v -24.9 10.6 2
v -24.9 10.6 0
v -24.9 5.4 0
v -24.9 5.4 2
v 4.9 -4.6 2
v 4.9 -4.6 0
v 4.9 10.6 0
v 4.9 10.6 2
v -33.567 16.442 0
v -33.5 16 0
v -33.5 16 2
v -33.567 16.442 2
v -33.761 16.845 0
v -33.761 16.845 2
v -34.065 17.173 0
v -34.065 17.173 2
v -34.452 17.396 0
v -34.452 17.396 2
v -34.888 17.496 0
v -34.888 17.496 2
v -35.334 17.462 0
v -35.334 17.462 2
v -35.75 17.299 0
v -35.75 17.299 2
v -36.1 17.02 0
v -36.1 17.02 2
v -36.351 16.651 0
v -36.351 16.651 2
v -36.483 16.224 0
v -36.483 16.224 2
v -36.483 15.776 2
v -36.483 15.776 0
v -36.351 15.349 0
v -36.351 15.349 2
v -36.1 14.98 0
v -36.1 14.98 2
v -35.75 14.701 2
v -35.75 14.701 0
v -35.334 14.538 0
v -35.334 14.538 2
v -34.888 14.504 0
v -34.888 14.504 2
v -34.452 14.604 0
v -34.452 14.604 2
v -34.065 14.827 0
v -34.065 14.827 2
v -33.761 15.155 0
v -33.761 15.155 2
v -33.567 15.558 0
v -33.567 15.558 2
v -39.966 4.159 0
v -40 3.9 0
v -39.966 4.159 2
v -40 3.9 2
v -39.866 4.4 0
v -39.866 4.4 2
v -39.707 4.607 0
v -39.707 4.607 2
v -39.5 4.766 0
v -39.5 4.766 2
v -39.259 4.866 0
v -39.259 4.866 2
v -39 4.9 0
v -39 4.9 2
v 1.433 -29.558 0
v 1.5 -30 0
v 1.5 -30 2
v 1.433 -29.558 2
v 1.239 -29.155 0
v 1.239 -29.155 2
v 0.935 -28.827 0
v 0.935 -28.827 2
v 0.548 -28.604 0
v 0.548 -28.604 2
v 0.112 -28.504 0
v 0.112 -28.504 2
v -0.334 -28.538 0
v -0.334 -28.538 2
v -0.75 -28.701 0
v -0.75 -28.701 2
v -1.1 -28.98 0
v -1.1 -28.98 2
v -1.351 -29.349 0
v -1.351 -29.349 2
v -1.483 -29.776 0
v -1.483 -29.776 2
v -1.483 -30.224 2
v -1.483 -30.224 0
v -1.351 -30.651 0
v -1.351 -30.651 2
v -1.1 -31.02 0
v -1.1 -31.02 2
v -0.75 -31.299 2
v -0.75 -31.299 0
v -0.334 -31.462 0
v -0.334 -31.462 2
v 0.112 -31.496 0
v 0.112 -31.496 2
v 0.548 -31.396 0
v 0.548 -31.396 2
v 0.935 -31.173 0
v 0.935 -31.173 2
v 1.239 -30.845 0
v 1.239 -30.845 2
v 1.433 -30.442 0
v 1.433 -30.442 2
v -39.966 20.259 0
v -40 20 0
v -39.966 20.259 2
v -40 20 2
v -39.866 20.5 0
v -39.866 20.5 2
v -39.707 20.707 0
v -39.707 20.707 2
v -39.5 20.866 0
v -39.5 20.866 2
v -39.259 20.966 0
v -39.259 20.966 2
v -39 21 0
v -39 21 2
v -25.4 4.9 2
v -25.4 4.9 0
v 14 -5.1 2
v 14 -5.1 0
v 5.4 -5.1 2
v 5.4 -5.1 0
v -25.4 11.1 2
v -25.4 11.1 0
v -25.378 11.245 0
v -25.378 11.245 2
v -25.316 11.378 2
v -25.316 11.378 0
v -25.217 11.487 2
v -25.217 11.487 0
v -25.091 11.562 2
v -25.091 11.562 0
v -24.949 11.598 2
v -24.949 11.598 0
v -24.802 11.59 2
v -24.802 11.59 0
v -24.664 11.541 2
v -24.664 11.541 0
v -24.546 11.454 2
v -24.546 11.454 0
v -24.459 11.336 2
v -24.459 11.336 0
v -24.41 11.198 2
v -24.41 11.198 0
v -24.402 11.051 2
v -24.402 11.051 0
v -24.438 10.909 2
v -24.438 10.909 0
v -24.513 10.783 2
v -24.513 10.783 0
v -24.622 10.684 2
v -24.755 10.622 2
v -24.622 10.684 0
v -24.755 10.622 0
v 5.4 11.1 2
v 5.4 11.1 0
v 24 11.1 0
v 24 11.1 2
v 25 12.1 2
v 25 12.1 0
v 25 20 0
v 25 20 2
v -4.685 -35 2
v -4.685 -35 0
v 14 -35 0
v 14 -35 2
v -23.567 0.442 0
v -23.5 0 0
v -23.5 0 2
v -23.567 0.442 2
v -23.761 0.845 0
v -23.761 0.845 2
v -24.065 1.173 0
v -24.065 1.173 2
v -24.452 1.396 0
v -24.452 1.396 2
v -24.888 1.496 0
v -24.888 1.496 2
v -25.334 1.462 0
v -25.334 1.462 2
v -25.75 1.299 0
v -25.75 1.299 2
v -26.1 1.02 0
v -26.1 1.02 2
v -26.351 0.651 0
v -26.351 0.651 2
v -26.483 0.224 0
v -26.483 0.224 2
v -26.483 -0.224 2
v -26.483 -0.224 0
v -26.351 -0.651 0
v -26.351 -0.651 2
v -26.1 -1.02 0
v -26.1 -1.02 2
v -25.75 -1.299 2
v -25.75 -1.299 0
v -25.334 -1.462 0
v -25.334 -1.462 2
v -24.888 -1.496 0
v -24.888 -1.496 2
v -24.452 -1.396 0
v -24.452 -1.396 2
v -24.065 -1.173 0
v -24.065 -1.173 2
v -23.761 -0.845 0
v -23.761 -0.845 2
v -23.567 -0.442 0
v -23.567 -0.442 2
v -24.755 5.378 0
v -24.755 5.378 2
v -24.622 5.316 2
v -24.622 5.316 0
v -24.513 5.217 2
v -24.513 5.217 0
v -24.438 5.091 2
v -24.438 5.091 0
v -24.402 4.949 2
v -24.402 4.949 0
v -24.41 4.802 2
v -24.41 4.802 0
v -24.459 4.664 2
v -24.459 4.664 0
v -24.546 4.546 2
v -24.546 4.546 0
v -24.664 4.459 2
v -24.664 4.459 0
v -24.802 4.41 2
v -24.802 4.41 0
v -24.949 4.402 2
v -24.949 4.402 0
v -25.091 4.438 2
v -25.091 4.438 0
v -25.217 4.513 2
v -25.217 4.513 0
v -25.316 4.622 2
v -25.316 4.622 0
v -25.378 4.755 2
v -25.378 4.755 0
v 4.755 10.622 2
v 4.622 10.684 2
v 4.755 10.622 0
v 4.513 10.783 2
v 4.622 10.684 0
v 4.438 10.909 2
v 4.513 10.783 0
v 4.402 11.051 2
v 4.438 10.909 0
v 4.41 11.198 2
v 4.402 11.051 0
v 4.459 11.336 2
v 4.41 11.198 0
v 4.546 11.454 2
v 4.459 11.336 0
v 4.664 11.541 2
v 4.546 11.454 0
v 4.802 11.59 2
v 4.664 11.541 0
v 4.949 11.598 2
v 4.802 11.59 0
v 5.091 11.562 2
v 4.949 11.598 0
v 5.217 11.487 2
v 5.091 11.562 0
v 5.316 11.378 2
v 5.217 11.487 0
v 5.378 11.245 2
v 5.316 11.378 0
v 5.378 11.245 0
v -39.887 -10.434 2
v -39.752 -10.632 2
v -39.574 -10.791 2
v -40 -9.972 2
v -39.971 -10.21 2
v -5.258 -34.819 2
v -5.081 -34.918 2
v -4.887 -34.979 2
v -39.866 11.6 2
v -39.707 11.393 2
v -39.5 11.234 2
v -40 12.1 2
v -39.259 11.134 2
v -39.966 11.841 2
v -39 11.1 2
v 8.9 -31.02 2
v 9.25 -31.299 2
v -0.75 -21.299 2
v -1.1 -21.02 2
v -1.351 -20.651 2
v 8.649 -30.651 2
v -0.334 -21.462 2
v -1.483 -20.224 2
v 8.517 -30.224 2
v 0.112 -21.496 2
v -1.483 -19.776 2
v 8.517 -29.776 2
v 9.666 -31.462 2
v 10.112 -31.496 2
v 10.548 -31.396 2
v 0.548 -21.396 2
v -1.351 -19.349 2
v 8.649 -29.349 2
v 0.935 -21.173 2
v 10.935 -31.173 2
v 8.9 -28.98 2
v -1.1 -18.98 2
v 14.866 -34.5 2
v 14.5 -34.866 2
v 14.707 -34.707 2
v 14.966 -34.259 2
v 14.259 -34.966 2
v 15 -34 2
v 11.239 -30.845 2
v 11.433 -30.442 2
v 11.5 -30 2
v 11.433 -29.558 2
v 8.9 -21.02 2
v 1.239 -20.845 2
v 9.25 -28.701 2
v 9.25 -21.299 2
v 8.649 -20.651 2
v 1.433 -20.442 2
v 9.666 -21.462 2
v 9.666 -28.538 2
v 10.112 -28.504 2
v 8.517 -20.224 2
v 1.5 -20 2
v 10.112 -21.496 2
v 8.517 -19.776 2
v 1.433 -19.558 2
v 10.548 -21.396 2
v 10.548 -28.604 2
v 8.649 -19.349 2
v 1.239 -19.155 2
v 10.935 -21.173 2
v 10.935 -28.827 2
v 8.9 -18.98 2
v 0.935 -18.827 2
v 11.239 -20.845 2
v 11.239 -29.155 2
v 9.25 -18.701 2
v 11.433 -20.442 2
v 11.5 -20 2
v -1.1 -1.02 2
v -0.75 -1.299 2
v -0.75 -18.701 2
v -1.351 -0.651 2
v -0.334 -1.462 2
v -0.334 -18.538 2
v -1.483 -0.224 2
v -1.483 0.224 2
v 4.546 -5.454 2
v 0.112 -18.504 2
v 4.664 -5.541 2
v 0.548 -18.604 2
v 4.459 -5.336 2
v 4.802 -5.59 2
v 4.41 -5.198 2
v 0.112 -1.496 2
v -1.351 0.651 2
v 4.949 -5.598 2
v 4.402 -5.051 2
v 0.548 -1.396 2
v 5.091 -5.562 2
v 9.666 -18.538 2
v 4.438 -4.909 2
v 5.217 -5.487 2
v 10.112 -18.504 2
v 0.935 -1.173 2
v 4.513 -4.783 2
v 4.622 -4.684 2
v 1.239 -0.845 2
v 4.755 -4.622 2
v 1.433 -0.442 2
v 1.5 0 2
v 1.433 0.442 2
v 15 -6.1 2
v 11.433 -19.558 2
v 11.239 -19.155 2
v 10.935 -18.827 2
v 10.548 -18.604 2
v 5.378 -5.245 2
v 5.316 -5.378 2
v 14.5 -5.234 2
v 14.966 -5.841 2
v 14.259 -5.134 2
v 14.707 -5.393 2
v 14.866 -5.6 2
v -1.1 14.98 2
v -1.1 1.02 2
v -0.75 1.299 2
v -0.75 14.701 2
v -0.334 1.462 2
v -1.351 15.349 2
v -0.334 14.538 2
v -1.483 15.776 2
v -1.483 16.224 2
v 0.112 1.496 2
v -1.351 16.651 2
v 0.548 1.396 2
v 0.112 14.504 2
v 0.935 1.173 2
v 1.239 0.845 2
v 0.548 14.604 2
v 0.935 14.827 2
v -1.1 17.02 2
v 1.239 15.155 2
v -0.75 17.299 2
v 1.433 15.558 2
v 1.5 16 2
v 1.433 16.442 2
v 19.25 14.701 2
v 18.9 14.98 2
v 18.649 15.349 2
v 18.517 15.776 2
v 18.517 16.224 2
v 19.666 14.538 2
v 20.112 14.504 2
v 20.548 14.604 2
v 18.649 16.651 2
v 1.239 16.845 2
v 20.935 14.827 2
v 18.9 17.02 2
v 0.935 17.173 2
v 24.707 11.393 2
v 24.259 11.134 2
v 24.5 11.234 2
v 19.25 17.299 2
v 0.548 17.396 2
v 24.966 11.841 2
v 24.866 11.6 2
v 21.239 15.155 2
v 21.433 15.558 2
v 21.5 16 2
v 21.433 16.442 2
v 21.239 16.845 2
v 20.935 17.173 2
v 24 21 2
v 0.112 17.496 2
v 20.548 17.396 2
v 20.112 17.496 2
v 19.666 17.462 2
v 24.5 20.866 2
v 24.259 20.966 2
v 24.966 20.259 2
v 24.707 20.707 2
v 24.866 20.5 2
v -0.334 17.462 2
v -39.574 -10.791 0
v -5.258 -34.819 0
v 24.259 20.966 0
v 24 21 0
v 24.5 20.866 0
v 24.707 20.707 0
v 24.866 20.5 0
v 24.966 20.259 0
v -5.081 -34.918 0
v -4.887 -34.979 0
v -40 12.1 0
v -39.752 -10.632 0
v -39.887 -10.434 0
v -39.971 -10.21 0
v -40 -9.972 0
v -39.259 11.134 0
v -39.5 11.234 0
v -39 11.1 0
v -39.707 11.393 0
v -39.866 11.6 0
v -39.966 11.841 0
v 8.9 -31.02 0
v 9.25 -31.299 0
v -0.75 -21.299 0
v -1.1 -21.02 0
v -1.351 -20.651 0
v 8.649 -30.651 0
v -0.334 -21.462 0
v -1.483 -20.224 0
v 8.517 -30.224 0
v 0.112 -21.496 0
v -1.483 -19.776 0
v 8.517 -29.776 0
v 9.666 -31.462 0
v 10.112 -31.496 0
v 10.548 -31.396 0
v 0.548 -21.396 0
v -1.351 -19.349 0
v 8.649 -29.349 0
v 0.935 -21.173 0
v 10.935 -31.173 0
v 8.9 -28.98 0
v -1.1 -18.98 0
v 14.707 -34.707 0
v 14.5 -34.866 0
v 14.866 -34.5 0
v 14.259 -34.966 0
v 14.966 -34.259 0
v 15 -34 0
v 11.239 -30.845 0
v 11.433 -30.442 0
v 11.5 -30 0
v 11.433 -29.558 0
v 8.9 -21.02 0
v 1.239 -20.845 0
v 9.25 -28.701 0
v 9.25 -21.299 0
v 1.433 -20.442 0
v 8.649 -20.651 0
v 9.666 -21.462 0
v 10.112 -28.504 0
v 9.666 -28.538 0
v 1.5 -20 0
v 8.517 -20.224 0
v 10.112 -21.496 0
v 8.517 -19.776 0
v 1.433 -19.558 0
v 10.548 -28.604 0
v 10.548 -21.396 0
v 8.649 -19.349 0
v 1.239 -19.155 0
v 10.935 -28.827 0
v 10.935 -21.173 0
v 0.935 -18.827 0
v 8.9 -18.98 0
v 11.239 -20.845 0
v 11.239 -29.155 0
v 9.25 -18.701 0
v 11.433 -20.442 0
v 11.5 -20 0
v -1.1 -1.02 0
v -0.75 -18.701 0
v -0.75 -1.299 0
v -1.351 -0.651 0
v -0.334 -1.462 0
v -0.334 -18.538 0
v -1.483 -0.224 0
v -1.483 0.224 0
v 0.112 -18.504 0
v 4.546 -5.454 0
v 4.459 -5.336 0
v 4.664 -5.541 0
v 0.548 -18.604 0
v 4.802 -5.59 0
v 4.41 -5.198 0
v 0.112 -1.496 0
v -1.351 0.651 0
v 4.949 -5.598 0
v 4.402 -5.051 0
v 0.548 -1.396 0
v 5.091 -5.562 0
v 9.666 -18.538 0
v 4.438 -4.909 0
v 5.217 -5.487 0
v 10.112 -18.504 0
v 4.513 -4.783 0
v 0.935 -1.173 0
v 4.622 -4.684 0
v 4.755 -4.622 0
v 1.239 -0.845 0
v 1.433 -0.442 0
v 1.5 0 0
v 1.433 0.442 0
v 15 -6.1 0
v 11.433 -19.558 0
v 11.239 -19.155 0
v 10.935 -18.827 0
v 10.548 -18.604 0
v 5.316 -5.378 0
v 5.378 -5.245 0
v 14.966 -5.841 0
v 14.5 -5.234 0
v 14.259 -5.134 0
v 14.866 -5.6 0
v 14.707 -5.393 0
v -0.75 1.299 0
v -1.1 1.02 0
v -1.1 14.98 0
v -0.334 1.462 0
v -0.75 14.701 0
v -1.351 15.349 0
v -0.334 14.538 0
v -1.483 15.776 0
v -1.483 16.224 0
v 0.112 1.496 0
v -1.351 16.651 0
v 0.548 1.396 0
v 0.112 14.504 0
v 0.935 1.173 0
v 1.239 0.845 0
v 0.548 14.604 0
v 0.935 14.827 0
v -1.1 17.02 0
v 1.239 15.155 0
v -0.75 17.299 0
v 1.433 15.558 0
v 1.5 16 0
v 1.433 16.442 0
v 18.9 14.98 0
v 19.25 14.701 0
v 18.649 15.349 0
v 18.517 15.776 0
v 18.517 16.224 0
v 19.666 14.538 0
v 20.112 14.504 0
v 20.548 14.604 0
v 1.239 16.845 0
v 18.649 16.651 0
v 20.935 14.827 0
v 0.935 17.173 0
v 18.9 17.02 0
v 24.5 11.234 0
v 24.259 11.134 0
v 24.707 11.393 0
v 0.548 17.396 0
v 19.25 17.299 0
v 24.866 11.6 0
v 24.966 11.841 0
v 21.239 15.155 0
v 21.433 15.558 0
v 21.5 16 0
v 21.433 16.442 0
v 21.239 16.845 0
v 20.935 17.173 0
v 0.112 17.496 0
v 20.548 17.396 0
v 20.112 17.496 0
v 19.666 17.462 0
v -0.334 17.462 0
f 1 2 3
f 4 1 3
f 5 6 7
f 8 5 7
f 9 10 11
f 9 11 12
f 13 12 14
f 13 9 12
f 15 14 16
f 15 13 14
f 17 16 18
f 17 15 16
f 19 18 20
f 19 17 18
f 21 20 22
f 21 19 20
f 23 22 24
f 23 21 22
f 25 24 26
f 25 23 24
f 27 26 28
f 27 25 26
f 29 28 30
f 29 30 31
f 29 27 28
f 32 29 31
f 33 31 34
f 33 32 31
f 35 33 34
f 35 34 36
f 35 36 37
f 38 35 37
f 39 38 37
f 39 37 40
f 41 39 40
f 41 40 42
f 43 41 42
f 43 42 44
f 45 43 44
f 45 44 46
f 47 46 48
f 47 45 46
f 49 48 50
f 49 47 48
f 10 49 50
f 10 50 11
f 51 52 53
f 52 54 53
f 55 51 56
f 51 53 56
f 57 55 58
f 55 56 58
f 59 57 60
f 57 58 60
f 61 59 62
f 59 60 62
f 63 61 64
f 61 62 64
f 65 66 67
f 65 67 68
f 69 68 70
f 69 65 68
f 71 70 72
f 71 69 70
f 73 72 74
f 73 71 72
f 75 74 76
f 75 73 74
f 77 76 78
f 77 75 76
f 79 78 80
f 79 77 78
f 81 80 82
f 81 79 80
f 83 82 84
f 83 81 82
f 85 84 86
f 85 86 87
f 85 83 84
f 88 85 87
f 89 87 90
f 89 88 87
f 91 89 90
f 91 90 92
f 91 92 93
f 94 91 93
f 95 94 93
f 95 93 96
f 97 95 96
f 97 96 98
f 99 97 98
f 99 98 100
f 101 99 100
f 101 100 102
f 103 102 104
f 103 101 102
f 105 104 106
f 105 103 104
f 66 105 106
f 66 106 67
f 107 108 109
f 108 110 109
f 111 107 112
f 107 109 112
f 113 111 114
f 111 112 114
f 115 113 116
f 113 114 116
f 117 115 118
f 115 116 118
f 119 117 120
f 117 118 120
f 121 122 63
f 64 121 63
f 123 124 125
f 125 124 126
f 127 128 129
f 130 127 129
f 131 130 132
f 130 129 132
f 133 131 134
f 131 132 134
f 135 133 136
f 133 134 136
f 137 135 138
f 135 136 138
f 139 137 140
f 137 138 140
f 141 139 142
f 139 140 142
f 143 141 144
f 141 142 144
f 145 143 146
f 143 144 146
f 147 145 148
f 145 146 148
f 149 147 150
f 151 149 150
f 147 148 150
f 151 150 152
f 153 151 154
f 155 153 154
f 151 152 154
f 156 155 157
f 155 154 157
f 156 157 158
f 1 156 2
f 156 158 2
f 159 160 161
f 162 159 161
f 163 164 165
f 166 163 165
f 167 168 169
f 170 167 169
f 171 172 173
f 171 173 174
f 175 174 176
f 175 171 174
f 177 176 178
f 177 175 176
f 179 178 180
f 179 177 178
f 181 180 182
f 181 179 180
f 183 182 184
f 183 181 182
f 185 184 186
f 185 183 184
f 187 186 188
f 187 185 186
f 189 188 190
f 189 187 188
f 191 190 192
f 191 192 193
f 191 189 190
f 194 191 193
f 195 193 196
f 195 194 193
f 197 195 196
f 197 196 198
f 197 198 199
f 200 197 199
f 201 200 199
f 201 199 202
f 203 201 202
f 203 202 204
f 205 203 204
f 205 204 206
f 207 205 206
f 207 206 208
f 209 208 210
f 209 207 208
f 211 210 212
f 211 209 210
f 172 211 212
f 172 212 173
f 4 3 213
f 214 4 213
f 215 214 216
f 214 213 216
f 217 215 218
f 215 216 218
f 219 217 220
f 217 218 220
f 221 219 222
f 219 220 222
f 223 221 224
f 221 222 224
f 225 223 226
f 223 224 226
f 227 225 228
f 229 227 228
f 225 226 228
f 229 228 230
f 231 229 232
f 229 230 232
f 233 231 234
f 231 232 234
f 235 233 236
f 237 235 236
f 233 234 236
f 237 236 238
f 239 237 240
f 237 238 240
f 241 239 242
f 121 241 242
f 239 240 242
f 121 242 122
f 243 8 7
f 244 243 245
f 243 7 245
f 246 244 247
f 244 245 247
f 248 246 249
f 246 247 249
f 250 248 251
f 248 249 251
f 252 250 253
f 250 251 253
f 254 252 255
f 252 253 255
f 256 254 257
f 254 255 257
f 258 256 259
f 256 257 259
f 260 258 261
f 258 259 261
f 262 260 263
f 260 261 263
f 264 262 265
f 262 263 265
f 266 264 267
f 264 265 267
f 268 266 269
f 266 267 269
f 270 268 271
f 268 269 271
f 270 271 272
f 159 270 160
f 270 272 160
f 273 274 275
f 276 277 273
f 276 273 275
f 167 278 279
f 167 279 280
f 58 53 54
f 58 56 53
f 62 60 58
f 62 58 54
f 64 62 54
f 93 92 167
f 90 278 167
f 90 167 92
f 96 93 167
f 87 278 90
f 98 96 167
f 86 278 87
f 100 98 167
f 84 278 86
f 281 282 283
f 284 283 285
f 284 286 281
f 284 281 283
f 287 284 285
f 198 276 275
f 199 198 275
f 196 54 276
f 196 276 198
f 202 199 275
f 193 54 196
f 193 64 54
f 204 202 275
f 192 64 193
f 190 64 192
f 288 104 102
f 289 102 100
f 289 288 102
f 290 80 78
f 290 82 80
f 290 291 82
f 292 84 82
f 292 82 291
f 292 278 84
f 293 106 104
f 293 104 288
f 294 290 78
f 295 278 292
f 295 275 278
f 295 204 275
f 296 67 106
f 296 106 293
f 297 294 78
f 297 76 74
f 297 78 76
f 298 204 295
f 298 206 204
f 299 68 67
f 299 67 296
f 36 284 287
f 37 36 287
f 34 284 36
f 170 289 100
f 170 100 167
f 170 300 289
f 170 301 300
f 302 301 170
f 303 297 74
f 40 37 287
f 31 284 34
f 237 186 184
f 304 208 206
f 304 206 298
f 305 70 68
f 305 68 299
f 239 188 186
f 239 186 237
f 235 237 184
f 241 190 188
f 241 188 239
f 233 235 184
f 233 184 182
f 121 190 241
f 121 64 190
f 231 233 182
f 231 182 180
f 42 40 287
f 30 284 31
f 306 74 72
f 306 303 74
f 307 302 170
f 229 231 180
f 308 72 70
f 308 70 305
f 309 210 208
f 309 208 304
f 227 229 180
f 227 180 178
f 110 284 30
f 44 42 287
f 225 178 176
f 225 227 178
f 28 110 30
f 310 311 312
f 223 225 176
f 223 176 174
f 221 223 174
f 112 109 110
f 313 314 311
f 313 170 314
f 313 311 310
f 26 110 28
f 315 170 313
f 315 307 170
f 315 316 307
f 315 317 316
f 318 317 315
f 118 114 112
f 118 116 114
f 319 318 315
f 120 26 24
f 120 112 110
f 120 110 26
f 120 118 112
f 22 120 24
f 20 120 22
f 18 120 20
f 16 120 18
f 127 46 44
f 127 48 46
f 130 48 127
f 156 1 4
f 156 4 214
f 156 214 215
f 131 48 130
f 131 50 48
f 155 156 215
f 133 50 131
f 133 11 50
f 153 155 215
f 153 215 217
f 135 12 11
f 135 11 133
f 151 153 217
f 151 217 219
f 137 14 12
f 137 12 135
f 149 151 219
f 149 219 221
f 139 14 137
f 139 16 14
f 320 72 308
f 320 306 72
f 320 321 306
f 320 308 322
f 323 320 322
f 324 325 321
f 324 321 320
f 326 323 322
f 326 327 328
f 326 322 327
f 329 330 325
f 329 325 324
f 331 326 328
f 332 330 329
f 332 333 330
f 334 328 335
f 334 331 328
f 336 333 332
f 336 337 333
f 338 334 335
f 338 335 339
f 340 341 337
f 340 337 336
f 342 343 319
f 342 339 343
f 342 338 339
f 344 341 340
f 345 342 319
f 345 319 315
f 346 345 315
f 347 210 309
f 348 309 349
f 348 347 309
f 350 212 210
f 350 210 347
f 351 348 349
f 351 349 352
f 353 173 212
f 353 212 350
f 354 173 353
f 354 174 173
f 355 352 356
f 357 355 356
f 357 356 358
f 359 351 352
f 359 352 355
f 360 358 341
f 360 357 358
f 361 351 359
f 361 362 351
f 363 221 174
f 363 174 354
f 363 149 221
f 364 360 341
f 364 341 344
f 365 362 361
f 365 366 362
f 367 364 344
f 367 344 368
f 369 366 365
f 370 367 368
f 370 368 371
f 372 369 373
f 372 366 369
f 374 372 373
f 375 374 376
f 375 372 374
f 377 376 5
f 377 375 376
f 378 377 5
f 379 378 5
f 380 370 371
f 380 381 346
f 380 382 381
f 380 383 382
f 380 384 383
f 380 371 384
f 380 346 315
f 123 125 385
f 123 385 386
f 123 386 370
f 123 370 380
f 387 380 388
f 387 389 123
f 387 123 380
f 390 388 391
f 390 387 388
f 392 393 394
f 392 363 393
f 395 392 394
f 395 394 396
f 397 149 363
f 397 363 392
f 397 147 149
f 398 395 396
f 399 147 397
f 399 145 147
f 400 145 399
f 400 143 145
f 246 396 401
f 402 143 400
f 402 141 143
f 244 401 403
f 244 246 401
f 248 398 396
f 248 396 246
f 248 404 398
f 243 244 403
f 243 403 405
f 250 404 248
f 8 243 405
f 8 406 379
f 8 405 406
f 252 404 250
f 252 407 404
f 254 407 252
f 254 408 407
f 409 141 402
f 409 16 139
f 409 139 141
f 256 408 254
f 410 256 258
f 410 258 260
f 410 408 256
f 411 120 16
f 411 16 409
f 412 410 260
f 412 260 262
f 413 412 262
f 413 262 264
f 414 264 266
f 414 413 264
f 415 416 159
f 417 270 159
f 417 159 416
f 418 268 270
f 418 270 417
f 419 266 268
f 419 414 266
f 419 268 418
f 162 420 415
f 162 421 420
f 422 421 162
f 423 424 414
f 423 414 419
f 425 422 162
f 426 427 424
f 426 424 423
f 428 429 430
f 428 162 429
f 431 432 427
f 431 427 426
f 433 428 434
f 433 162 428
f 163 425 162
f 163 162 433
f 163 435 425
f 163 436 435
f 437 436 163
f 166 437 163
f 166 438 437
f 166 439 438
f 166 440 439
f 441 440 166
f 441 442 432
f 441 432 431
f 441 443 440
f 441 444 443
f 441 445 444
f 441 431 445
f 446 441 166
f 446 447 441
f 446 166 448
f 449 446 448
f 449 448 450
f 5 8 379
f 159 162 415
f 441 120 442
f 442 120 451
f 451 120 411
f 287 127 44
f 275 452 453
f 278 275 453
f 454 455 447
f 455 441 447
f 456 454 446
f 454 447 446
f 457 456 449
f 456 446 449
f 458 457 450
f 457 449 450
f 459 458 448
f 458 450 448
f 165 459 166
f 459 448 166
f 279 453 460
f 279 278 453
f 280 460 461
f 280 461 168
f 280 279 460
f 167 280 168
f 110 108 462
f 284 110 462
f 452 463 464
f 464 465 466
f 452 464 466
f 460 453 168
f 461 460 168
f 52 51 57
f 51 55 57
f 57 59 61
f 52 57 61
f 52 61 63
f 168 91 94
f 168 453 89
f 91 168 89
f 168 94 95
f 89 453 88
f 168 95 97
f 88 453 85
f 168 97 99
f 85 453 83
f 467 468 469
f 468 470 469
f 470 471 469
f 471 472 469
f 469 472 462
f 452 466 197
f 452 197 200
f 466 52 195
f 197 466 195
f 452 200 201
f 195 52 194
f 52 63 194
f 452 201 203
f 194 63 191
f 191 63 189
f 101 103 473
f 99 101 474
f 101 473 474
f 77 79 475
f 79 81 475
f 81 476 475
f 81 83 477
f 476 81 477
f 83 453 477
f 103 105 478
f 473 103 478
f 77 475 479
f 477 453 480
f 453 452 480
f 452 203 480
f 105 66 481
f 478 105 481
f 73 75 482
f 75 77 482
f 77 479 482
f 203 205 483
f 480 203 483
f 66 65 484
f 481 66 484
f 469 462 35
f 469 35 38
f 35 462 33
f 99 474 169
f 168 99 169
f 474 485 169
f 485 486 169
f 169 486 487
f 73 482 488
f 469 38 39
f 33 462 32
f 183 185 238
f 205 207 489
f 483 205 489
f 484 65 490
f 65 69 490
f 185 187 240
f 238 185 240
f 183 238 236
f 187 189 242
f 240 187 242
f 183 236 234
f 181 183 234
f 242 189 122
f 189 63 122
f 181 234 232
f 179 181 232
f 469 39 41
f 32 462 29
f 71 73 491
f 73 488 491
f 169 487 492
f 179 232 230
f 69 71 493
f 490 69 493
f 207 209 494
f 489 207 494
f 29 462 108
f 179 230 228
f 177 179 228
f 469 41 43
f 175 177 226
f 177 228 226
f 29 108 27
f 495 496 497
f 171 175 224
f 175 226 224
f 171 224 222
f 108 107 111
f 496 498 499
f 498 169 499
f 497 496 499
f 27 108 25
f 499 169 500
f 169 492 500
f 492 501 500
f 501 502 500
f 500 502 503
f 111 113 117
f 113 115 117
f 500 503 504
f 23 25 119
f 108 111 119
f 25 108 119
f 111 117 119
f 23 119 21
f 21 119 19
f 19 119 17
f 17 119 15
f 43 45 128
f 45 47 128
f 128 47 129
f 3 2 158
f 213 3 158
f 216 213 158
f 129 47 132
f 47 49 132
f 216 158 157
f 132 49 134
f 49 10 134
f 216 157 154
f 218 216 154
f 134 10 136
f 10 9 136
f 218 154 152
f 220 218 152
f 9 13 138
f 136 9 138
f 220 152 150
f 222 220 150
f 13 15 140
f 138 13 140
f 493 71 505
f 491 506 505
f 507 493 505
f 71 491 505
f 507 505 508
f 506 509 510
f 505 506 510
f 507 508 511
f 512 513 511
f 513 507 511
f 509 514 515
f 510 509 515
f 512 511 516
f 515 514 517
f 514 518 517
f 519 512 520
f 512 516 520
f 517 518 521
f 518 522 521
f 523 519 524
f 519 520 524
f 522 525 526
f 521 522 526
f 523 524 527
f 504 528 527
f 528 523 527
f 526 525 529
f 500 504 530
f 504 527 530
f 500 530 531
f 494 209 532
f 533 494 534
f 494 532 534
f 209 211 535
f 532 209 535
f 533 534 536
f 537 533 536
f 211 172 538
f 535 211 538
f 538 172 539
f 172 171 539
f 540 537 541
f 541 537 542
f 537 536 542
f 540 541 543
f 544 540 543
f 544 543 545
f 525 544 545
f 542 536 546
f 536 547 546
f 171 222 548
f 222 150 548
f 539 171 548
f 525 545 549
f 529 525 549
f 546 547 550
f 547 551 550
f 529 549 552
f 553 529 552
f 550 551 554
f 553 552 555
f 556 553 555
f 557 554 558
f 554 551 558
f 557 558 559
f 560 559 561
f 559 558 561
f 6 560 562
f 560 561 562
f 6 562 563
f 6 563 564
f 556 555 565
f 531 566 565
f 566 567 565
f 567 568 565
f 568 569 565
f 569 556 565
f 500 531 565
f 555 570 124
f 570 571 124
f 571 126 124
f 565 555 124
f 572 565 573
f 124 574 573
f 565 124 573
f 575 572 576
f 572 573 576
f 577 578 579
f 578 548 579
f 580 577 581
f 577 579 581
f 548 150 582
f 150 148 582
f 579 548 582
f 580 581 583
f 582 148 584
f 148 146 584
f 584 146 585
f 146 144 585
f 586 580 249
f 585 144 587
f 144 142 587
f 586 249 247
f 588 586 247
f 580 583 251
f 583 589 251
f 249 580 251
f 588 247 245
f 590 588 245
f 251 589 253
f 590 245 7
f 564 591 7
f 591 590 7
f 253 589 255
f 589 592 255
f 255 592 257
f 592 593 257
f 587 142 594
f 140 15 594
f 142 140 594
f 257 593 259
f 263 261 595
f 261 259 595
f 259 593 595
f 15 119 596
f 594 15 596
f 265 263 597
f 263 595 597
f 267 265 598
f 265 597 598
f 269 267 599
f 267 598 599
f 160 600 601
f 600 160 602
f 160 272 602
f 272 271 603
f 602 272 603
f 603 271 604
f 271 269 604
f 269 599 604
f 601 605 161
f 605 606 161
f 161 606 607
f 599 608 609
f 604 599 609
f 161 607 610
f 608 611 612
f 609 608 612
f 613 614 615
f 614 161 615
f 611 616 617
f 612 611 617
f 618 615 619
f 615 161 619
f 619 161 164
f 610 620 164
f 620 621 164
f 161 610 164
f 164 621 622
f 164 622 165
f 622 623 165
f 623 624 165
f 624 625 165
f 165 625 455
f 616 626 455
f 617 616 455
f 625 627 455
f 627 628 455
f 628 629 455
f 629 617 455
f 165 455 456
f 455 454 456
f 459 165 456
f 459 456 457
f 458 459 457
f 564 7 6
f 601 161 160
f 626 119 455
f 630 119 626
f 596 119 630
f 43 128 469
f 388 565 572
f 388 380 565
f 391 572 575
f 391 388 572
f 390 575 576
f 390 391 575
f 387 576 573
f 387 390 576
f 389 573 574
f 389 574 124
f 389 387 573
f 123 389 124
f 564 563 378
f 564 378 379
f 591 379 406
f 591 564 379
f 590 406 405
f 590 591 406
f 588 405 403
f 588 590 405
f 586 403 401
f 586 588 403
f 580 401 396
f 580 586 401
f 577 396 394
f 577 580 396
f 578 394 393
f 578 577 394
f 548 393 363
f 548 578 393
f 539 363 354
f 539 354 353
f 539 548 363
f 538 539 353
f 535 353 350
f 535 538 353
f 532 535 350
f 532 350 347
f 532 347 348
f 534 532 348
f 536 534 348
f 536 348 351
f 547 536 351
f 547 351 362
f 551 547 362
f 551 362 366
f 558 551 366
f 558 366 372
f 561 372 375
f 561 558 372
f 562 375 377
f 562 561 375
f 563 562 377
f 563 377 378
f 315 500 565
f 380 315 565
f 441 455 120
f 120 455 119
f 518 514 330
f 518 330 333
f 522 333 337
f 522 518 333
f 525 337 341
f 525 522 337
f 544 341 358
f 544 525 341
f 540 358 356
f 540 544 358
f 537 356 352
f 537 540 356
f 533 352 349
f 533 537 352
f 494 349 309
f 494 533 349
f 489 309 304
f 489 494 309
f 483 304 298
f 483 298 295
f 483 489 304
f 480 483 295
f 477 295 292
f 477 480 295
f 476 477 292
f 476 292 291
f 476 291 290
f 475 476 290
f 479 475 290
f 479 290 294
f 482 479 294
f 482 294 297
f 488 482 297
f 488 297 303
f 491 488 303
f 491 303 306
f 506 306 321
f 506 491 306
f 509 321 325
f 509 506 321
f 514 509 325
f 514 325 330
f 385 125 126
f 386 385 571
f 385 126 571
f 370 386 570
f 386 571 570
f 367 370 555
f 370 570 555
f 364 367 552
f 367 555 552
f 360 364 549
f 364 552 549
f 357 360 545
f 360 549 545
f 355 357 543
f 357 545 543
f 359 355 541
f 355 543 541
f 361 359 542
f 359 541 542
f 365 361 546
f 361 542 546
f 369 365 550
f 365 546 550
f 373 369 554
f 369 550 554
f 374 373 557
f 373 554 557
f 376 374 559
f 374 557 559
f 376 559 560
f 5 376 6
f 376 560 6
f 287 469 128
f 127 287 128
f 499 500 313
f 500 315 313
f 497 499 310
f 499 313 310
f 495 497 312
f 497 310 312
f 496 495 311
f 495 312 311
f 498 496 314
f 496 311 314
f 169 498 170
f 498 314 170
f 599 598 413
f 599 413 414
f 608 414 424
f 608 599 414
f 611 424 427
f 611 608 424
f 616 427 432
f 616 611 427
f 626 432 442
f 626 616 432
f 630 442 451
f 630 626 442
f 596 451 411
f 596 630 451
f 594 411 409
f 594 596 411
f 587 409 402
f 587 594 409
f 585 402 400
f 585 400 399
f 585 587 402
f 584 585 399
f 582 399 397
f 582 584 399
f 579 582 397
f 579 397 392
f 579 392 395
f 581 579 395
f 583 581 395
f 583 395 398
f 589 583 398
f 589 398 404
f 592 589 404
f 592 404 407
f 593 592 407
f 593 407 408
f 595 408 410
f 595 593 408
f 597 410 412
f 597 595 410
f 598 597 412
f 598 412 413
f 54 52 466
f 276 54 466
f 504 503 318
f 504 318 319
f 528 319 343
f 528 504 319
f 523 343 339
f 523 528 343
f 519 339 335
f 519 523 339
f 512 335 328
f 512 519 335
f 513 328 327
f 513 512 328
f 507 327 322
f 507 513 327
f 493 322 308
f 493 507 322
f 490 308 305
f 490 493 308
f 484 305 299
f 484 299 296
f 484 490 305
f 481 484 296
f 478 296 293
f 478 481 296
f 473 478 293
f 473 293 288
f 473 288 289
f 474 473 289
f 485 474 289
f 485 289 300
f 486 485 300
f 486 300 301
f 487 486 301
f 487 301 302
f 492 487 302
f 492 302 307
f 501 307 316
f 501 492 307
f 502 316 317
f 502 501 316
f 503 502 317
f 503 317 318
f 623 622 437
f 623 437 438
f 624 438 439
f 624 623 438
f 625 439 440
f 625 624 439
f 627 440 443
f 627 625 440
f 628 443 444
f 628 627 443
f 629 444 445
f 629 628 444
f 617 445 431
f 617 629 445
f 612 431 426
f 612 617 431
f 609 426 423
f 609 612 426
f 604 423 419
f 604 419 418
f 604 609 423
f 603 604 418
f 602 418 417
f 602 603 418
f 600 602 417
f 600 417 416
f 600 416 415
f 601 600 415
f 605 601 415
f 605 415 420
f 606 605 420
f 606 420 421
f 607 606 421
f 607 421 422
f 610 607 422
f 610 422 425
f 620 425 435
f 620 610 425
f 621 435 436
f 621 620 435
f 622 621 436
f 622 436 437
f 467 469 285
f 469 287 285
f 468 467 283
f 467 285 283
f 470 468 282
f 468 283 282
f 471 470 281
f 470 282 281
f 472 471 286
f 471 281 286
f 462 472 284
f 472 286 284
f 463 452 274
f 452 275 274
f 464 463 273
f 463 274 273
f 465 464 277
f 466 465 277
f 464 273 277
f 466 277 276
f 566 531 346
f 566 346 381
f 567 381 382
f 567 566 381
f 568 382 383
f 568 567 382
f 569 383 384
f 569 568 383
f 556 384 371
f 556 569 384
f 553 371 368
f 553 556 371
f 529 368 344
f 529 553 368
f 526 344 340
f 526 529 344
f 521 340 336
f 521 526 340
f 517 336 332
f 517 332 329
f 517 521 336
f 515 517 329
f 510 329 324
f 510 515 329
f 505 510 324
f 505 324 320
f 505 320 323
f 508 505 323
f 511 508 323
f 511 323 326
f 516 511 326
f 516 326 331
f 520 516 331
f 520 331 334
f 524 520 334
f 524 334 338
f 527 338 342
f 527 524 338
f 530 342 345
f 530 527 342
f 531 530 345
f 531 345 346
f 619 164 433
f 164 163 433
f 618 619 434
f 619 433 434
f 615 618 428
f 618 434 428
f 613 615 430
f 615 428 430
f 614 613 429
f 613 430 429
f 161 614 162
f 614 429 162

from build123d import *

# Parameters (mm, degrees)
SKETCH_1_R          = 1.5
EXTRUDE_1_DEPTH     = 2
SKETCH_2_R          = 0.5
CUT_EXTRUDE_1_DEPTH = 10
FILLET_2_R          = 1


with BuildPart() as part:
    # 草图1 → 凸台-拉伸1 (new body)
    with BuildSketch(Plane.XY):
        Polygon((15, -35), (15, -5.1), (4.9, -5.1), (4.9, 11.1), (25, 11.1), (25, 21), (-40, 21), (-40, 11.1), (-24.9, 11.1), (-24.9, 4.9), (-40, 4.9), (-40, -10.492736163), (-5, -35), align=None)
        with Locations((-35, 16)):
            Circle(SKETCH_1_R, mode=Mode.SUBTRACT)
        with Locations((10, -30)):
            Circle(SKETCH_1_R, mode=Mode.SUBTRACT)
        with Locations((10, -20)):
            Circle(SKETCH_1_R, mode=Mode.SUBTRACT)
        with Locations((0, 16)):
            Circle(SKETCH_1_R, mode=Mode.SUBTRACT)
        with Locations((20, 16)):
            Circle(SKETCH_1_R, mode=Mode.SUBTRACT)
        with Locations((-25, 0)):
            Circle(SKETCH_1_R, mode=Mode.SUBTRACT)
        Circle(SKETCH_1_R, mode=Mode.SUBTRACT)
        with Locations((0, -20)):
            Circle(SKETCH_1_R, mode=Mode.SUBTRACT)
        with Locations((0, -30)):
            Circle(SKETCH_1_R, mode=Mode.SUBTRACT)
    extrude(amount=EXTRUDE_1_DEPTH)

    # 草图2 → 切除-拉伸1 (cut)
    with BuildSketch(Plane(origin=(0, 0, 0), x_dir=(-1, 0, 0), z_dir=(0, 0, -1))):
        with Locations((-4.9, 11.1)):
            Circle(SKETCH_2_R)
        with Locations((-4.9, -5.1)):
            Circle(SKETCH_2_R)
        with Locations((24.9, 11.1)):
            Circle(SKETCH_2_R)
        with Locations((24.9, 4.9)):
            Circle(SKETCH_2_R)
    extrude(amount=-CUT_EXTRUDE_1_DEPTH, mode=Mode.SUBTRACT)

    # 圆角2
    fillet_2_edges = [part.edges().sort_by_distance(p)[0] for p in [
        (-40, 11.1, 1),
        (-40, 21, 1),
        (25, 21, 1),
        (25, 11.1, 1),
        (15, -5.1, 1),
        (15, -35, 1),
        (-5, -35, 1),
        (-40, -10.492736163, 1),
        (-40, 4.9, 1),
    ]]
    fillet(fillet_2_edges, radius=FILLET_2_R)


solid = part.part
